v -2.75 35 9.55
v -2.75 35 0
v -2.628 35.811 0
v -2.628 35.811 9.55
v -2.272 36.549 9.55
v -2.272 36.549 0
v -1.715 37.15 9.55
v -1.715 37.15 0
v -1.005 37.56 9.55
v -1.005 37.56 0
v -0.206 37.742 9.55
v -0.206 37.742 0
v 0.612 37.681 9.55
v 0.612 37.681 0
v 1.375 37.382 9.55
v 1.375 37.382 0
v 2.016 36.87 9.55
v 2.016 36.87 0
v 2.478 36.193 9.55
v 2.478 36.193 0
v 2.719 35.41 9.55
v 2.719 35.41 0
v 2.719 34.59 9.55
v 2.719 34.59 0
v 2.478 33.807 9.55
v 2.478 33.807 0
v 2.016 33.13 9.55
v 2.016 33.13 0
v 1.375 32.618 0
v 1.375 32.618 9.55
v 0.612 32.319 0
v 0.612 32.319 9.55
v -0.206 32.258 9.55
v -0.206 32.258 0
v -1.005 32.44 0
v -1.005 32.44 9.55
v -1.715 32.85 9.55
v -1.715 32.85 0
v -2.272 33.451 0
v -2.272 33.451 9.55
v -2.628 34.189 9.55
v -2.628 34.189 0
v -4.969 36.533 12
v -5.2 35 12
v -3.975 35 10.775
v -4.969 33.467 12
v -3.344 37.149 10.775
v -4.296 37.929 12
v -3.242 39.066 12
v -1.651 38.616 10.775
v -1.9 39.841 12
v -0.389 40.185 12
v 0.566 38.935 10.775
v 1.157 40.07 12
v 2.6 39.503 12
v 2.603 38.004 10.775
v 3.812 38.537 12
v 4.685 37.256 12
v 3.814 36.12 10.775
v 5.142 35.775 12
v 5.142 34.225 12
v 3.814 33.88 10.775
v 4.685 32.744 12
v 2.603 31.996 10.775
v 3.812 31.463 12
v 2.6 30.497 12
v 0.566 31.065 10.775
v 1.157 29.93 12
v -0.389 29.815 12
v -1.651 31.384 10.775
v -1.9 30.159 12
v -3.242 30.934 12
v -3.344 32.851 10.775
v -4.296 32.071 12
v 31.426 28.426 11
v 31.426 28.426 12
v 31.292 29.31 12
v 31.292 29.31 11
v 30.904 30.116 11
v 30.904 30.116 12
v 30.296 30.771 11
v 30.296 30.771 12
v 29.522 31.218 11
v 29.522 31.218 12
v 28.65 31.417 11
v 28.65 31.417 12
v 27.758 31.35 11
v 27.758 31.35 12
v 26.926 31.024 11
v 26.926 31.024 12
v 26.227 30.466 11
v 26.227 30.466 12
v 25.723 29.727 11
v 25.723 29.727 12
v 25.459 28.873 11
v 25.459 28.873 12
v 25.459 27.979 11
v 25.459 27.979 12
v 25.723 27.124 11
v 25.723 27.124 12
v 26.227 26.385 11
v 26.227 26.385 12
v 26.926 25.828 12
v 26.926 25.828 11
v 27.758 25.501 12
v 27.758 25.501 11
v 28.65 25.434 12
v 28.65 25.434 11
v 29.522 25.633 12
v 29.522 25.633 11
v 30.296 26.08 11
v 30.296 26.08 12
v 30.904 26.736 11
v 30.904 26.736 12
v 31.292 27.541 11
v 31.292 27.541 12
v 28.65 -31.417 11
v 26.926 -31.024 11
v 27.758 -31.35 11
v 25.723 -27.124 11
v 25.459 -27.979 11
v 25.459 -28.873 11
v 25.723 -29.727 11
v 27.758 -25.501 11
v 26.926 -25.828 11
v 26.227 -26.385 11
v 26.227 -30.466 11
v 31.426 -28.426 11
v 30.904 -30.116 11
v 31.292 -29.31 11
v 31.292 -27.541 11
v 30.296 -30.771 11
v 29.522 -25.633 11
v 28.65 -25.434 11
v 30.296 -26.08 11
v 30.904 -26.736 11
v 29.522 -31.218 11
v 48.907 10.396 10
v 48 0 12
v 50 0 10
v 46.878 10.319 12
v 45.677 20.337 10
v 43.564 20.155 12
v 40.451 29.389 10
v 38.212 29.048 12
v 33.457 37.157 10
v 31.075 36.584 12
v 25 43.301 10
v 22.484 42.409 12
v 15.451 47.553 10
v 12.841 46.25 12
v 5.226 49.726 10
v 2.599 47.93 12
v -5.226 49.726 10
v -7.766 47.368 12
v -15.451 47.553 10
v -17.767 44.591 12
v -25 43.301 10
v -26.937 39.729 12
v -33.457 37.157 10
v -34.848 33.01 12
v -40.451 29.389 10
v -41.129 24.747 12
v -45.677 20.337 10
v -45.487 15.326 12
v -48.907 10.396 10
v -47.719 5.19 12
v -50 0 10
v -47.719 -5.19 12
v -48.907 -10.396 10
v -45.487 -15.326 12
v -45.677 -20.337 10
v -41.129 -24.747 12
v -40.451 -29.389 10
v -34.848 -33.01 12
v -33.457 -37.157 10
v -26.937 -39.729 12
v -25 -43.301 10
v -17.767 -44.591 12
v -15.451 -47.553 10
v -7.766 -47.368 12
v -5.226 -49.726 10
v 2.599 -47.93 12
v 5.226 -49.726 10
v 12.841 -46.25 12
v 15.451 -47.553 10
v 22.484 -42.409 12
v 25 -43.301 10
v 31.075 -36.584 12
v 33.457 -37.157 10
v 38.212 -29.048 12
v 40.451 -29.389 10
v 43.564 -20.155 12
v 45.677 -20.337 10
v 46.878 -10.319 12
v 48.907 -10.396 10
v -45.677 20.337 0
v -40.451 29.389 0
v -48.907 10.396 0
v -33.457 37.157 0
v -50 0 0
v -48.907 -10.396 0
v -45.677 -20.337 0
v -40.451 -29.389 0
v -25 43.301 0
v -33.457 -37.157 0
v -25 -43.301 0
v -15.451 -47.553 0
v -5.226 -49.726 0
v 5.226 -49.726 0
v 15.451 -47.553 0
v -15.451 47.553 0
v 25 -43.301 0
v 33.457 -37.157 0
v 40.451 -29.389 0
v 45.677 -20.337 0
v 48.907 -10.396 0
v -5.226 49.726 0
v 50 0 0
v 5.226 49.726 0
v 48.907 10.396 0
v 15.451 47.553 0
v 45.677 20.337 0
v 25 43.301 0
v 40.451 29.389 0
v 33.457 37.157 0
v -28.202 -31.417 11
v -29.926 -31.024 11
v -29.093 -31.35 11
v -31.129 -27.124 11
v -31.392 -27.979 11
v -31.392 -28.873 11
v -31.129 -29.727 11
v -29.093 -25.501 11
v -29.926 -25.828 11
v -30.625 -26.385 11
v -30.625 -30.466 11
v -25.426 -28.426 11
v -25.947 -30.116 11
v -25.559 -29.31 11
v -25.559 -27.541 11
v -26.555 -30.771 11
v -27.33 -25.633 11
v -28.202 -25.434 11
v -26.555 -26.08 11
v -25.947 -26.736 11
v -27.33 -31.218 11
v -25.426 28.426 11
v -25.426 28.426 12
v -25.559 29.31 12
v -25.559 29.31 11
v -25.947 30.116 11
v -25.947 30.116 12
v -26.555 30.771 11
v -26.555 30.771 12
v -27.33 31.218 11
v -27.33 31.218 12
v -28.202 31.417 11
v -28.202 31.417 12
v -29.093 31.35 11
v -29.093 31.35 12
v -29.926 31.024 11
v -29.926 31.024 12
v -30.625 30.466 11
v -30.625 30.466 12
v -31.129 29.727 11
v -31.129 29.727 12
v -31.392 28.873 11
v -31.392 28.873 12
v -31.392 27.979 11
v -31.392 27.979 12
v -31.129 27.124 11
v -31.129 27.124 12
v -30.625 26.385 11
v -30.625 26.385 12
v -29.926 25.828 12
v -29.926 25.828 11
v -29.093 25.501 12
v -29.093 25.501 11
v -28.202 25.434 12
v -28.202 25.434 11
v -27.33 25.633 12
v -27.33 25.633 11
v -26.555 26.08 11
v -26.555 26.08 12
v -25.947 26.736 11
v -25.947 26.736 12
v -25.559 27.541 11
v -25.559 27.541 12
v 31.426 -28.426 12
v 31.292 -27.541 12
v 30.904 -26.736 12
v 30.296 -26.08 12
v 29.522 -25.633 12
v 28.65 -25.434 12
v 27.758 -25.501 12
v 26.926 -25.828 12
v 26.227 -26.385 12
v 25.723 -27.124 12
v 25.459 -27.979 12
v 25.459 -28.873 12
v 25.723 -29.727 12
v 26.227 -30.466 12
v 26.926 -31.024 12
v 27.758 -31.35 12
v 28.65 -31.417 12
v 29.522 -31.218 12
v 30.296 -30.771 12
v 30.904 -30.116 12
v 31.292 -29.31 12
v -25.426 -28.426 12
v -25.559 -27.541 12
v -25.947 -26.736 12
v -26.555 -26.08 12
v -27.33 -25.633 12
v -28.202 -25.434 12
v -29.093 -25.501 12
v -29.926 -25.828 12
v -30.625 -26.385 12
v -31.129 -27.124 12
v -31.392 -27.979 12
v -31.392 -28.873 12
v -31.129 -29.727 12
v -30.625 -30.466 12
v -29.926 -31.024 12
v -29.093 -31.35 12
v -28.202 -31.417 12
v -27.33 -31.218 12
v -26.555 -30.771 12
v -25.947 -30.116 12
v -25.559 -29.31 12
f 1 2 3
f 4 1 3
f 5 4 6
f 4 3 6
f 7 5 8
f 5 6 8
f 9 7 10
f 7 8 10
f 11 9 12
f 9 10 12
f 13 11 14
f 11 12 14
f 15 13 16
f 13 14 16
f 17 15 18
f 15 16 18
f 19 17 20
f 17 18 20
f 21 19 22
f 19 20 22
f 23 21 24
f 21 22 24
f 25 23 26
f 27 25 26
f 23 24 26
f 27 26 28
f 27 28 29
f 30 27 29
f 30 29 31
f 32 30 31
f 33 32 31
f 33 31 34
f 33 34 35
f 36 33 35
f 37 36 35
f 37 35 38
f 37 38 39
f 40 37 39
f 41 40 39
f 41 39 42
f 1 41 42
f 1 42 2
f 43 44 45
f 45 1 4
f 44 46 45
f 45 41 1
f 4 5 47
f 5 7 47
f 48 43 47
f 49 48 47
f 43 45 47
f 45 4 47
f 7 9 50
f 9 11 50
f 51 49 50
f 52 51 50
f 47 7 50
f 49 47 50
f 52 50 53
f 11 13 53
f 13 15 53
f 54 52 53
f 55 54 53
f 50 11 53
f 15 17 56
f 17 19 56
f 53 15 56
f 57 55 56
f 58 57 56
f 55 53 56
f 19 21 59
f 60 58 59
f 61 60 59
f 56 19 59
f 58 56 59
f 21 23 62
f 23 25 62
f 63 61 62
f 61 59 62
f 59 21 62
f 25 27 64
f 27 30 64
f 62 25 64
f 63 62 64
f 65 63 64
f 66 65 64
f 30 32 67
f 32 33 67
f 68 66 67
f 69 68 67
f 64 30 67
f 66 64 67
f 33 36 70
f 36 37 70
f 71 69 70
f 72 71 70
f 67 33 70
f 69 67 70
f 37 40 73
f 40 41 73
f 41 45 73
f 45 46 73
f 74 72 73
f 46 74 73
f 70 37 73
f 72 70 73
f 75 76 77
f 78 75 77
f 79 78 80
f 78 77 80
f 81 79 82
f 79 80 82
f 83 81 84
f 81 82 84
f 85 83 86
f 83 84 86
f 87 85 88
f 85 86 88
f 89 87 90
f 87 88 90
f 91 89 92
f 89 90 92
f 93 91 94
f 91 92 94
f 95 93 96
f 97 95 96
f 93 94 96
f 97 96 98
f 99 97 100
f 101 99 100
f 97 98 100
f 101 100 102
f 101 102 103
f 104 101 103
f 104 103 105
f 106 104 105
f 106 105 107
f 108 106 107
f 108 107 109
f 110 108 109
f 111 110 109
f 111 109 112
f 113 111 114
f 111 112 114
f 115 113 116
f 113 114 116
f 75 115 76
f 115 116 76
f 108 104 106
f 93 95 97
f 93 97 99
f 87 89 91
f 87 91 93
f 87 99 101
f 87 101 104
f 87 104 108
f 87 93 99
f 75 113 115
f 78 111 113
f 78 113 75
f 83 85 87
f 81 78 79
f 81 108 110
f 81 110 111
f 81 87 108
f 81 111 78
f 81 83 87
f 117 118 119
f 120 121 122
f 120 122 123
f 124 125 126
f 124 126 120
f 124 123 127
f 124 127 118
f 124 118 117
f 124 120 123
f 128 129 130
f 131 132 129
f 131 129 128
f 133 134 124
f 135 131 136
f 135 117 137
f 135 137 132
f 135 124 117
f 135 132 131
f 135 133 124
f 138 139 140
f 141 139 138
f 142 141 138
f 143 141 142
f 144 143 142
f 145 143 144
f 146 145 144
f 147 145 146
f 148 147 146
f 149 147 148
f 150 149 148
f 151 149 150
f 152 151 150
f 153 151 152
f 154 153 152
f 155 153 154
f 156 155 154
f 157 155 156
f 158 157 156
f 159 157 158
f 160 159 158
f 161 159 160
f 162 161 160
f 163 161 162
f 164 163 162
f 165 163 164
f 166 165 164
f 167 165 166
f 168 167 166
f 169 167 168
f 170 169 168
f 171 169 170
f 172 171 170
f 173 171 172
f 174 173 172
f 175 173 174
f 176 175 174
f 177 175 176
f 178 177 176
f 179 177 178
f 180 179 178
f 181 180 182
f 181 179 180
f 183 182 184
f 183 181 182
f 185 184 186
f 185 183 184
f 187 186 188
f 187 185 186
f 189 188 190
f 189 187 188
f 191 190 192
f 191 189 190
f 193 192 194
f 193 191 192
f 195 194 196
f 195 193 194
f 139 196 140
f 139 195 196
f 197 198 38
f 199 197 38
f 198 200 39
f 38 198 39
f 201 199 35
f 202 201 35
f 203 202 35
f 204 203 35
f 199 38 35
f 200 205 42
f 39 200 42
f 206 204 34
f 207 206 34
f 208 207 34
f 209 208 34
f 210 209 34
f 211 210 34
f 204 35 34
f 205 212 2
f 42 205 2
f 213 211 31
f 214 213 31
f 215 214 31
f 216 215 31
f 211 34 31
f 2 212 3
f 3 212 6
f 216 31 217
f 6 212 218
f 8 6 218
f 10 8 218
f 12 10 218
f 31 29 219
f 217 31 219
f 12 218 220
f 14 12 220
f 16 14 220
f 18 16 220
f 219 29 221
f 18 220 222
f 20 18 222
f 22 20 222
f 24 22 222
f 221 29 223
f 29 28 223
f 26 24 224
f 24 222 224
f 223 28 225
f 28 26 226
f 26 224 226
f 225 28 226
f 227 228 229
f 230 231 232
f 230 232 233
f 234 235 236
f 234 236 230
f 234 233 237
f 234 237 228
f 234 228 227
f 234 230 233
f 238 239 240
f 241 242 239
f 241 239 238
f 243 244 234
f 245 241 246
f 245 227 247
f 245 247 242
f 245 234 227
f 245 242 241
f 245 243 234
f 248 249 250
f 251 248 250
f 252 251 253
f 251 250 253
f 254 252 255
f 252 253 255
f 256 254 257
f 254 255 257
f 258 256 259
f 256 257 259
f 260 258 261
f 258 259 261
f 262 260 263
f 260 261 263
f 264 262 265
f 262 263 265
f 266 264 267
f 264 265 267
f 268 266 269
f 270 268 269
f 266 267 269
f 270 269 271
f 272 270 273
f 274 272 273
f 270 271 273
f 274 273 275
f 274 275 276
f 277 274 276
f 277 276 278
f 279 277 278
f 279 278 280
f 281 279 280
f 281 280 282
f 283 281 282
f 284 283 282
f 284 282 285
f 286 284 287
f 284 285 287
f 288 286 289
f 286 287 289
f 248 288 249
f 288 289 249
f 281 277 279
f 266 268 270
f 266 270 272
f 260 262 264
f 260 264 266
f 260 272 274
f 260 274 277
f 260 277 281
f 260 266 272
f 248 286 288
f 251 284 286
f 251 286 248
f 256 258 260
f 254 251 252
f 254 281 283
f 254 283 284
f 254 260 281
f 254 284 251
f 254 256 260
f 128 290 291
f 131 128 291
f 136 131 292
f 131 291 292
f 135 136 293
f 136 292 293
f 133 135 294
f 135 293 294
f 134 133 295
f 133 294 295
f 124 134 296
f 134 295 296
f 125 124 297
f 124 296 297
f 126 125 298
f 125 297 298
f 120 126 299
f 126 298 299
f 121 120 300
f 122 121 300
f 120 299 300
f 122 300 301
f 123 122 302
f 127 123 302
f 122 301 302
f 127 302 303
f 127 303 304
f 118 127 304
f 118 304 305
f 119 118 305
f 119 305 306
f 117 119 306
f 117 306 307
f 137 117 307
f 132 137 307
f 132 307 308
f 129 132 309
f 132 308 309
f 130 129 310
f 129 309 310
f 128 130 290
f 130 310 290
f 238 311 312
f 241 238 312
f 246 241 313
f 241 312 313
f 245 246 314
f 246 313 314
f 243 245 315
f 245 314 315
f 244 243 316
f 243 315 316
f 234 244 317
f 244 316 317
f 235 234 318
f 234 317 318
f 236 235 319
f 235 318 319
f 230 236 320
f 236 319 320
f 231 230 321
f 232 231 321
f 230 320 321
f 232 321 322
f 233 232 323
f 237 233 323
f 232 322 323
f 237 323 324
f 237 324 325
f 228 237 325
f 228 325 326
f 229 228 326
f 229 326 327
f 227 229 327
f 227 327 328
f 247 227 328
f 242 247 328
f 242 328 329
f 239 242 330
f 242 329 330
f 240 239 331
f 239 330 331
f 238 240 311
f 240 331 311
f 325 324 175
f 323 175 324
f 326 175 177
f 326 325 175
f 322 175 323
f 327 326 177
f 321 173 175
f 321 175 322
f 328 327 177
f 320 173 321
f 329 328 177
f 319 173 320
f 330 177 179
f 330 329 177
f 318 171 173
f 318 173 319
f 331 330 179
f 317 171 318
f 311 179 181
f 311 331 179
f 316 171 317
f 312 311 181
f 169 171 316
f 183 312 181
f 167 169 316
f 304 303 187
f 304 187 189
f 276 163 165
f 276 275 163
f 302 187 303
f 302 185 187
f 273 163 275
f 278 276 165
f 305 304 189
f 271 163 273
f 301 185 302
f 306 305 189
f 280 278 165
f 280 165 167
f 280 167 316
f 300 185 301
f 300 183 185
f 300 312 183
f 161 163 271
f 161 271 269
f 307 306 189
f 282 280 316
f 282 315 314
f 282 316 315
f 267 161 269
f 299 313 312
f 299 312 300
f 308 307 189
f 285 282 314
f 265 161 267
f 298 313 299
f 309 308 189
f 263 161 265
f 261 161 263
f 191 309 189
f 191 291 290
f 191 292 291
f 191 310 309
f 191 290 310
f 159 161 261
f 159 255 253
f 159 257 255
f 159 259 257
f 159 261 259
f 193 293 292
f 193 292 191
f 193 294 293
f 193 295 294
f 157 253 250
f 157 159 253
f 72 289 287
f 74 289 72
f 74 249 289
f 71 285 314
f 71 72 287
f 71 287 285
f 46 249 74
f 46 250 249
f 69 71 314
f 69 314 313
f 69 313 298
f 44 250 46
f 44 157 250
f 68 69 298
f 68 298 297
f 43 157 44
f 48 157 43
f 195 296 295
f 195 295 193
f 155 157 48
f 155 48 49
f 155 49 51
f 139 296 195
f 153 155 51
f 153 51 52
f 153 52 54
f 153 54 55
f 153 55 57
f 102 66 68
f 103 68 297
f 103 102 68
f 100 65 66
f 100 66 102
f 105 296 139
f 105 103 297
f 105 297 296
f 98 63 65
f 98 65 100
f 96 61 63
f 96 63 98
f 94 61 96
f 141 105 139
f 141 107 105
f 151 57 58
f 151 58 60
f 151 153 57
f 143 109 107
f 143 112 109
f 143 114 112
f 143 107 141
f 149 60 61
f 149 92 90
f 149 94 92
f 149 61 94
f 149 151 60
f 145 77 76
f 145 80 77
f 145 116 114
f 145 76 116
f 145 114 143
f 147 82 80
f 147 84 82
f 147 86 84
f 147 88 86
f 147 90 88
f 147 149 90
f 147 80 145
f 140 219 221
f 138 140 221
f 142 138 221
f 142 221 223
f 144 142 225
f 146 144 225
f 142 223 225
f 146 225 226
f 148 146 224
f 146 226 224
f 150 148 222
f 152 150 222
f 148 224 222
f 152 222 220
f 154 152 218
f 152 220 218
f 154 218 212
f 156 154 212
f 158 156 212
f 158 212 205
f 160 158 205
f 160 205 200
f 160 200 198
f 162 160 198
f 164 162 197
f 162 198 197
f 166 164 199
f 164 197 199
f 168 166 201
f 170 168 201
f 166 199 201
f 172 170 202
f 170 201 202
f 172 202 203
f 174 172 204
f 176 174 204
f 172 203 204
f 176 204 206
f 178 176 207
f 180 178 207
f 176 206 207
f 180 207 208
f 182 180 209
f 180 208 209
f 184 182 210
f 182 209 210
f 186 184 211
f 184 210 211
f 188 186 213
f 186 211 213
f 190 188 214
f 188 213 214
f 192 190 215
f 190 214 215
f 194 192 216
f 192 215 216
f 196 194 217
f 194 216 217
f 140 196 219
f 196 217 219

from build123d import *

# Parameters (mm, degrees)
SKETCH2_R                                       = 50
BOSS_EXTRUDE1_DEPTH                             = 12
CSK_FOR_M5_FLAT_HEAD_MACHINE_SCREW1_D           = 5.5
CSK_FOR_M5_FLAT_HEAD_MACHINE_SCREW1_DEPTH       = 12
CSK_FOR_M5_FLAT_HEAD_MACHINE_SCREW1_CSINK_D     = 10.4
CSK_FOR_M5_FLAT_HEAD_MACHINE_SCREW1_CSINK_ANGLE = 90
SKETCH6_R                                       = 3
CUT_EXTRUDE1_DEPTH                              = 1
CHAMFER1_SIZE                                   = 2


with BuildPart() as part:
    # Sketch2 → Boss-Extrude1 (new body)
    with BuildSketch(Plane.XY):
        Circle(SKETCH2_R)
    extrude(amount=BOSS_EXTRUDE1_DEPTH)

    # CSK for M5 Flat Head Machine Screw1
    with Locations(Plane.XY.offset(12)):
        with Locations((0, 35)):
            CounterSinkHole(CSK_FOR_M5_FLAT_HEAD_MACHINE_SCREW1_D / 2, CSK_FOR_M5_FLAT_HEAD_MACHINE_SCREW1_CSINK_D / 2, depth=CSK_FOR_M5_FLAT_HEAD_MACHINE_SCREW1_DEPTH, counter_sink_angle=CSK_FOR_M5_FLAT_HEAD_MACHINE_SCREW1_CSINK_ANGLE)

    # Sketch6 → Cut-Extrude1 (cut)
    with BuildSketch(Plane.XY.offset(12)):
        with Locations((-28.425692604, 28.425692604)):
            Circle(SKETCH6_R)
        with Locations((28.425692604, 28.425692604)):
            Circle(SKETCH6_R)
        with Locations((28.425692604, -28.425692604)):
            Circle(SKETCH6_R)
        with Locations((-28.425692604, -28.425692604)):
            Circle(SKETCH6_R)
    extrude(amount=-CUT_EXTRUDE1_DEPTH, mode=Mode.SUBTRACT)

    # Chamfer1
    chamfer1_edges = [part.edges().sort_by_distance(p)[0] for p in [
        (-50, 0, 12),
    ]]
    chamfer(chamfer1_edges, length=CHAMFER1_SIZE)


solid = part.part
